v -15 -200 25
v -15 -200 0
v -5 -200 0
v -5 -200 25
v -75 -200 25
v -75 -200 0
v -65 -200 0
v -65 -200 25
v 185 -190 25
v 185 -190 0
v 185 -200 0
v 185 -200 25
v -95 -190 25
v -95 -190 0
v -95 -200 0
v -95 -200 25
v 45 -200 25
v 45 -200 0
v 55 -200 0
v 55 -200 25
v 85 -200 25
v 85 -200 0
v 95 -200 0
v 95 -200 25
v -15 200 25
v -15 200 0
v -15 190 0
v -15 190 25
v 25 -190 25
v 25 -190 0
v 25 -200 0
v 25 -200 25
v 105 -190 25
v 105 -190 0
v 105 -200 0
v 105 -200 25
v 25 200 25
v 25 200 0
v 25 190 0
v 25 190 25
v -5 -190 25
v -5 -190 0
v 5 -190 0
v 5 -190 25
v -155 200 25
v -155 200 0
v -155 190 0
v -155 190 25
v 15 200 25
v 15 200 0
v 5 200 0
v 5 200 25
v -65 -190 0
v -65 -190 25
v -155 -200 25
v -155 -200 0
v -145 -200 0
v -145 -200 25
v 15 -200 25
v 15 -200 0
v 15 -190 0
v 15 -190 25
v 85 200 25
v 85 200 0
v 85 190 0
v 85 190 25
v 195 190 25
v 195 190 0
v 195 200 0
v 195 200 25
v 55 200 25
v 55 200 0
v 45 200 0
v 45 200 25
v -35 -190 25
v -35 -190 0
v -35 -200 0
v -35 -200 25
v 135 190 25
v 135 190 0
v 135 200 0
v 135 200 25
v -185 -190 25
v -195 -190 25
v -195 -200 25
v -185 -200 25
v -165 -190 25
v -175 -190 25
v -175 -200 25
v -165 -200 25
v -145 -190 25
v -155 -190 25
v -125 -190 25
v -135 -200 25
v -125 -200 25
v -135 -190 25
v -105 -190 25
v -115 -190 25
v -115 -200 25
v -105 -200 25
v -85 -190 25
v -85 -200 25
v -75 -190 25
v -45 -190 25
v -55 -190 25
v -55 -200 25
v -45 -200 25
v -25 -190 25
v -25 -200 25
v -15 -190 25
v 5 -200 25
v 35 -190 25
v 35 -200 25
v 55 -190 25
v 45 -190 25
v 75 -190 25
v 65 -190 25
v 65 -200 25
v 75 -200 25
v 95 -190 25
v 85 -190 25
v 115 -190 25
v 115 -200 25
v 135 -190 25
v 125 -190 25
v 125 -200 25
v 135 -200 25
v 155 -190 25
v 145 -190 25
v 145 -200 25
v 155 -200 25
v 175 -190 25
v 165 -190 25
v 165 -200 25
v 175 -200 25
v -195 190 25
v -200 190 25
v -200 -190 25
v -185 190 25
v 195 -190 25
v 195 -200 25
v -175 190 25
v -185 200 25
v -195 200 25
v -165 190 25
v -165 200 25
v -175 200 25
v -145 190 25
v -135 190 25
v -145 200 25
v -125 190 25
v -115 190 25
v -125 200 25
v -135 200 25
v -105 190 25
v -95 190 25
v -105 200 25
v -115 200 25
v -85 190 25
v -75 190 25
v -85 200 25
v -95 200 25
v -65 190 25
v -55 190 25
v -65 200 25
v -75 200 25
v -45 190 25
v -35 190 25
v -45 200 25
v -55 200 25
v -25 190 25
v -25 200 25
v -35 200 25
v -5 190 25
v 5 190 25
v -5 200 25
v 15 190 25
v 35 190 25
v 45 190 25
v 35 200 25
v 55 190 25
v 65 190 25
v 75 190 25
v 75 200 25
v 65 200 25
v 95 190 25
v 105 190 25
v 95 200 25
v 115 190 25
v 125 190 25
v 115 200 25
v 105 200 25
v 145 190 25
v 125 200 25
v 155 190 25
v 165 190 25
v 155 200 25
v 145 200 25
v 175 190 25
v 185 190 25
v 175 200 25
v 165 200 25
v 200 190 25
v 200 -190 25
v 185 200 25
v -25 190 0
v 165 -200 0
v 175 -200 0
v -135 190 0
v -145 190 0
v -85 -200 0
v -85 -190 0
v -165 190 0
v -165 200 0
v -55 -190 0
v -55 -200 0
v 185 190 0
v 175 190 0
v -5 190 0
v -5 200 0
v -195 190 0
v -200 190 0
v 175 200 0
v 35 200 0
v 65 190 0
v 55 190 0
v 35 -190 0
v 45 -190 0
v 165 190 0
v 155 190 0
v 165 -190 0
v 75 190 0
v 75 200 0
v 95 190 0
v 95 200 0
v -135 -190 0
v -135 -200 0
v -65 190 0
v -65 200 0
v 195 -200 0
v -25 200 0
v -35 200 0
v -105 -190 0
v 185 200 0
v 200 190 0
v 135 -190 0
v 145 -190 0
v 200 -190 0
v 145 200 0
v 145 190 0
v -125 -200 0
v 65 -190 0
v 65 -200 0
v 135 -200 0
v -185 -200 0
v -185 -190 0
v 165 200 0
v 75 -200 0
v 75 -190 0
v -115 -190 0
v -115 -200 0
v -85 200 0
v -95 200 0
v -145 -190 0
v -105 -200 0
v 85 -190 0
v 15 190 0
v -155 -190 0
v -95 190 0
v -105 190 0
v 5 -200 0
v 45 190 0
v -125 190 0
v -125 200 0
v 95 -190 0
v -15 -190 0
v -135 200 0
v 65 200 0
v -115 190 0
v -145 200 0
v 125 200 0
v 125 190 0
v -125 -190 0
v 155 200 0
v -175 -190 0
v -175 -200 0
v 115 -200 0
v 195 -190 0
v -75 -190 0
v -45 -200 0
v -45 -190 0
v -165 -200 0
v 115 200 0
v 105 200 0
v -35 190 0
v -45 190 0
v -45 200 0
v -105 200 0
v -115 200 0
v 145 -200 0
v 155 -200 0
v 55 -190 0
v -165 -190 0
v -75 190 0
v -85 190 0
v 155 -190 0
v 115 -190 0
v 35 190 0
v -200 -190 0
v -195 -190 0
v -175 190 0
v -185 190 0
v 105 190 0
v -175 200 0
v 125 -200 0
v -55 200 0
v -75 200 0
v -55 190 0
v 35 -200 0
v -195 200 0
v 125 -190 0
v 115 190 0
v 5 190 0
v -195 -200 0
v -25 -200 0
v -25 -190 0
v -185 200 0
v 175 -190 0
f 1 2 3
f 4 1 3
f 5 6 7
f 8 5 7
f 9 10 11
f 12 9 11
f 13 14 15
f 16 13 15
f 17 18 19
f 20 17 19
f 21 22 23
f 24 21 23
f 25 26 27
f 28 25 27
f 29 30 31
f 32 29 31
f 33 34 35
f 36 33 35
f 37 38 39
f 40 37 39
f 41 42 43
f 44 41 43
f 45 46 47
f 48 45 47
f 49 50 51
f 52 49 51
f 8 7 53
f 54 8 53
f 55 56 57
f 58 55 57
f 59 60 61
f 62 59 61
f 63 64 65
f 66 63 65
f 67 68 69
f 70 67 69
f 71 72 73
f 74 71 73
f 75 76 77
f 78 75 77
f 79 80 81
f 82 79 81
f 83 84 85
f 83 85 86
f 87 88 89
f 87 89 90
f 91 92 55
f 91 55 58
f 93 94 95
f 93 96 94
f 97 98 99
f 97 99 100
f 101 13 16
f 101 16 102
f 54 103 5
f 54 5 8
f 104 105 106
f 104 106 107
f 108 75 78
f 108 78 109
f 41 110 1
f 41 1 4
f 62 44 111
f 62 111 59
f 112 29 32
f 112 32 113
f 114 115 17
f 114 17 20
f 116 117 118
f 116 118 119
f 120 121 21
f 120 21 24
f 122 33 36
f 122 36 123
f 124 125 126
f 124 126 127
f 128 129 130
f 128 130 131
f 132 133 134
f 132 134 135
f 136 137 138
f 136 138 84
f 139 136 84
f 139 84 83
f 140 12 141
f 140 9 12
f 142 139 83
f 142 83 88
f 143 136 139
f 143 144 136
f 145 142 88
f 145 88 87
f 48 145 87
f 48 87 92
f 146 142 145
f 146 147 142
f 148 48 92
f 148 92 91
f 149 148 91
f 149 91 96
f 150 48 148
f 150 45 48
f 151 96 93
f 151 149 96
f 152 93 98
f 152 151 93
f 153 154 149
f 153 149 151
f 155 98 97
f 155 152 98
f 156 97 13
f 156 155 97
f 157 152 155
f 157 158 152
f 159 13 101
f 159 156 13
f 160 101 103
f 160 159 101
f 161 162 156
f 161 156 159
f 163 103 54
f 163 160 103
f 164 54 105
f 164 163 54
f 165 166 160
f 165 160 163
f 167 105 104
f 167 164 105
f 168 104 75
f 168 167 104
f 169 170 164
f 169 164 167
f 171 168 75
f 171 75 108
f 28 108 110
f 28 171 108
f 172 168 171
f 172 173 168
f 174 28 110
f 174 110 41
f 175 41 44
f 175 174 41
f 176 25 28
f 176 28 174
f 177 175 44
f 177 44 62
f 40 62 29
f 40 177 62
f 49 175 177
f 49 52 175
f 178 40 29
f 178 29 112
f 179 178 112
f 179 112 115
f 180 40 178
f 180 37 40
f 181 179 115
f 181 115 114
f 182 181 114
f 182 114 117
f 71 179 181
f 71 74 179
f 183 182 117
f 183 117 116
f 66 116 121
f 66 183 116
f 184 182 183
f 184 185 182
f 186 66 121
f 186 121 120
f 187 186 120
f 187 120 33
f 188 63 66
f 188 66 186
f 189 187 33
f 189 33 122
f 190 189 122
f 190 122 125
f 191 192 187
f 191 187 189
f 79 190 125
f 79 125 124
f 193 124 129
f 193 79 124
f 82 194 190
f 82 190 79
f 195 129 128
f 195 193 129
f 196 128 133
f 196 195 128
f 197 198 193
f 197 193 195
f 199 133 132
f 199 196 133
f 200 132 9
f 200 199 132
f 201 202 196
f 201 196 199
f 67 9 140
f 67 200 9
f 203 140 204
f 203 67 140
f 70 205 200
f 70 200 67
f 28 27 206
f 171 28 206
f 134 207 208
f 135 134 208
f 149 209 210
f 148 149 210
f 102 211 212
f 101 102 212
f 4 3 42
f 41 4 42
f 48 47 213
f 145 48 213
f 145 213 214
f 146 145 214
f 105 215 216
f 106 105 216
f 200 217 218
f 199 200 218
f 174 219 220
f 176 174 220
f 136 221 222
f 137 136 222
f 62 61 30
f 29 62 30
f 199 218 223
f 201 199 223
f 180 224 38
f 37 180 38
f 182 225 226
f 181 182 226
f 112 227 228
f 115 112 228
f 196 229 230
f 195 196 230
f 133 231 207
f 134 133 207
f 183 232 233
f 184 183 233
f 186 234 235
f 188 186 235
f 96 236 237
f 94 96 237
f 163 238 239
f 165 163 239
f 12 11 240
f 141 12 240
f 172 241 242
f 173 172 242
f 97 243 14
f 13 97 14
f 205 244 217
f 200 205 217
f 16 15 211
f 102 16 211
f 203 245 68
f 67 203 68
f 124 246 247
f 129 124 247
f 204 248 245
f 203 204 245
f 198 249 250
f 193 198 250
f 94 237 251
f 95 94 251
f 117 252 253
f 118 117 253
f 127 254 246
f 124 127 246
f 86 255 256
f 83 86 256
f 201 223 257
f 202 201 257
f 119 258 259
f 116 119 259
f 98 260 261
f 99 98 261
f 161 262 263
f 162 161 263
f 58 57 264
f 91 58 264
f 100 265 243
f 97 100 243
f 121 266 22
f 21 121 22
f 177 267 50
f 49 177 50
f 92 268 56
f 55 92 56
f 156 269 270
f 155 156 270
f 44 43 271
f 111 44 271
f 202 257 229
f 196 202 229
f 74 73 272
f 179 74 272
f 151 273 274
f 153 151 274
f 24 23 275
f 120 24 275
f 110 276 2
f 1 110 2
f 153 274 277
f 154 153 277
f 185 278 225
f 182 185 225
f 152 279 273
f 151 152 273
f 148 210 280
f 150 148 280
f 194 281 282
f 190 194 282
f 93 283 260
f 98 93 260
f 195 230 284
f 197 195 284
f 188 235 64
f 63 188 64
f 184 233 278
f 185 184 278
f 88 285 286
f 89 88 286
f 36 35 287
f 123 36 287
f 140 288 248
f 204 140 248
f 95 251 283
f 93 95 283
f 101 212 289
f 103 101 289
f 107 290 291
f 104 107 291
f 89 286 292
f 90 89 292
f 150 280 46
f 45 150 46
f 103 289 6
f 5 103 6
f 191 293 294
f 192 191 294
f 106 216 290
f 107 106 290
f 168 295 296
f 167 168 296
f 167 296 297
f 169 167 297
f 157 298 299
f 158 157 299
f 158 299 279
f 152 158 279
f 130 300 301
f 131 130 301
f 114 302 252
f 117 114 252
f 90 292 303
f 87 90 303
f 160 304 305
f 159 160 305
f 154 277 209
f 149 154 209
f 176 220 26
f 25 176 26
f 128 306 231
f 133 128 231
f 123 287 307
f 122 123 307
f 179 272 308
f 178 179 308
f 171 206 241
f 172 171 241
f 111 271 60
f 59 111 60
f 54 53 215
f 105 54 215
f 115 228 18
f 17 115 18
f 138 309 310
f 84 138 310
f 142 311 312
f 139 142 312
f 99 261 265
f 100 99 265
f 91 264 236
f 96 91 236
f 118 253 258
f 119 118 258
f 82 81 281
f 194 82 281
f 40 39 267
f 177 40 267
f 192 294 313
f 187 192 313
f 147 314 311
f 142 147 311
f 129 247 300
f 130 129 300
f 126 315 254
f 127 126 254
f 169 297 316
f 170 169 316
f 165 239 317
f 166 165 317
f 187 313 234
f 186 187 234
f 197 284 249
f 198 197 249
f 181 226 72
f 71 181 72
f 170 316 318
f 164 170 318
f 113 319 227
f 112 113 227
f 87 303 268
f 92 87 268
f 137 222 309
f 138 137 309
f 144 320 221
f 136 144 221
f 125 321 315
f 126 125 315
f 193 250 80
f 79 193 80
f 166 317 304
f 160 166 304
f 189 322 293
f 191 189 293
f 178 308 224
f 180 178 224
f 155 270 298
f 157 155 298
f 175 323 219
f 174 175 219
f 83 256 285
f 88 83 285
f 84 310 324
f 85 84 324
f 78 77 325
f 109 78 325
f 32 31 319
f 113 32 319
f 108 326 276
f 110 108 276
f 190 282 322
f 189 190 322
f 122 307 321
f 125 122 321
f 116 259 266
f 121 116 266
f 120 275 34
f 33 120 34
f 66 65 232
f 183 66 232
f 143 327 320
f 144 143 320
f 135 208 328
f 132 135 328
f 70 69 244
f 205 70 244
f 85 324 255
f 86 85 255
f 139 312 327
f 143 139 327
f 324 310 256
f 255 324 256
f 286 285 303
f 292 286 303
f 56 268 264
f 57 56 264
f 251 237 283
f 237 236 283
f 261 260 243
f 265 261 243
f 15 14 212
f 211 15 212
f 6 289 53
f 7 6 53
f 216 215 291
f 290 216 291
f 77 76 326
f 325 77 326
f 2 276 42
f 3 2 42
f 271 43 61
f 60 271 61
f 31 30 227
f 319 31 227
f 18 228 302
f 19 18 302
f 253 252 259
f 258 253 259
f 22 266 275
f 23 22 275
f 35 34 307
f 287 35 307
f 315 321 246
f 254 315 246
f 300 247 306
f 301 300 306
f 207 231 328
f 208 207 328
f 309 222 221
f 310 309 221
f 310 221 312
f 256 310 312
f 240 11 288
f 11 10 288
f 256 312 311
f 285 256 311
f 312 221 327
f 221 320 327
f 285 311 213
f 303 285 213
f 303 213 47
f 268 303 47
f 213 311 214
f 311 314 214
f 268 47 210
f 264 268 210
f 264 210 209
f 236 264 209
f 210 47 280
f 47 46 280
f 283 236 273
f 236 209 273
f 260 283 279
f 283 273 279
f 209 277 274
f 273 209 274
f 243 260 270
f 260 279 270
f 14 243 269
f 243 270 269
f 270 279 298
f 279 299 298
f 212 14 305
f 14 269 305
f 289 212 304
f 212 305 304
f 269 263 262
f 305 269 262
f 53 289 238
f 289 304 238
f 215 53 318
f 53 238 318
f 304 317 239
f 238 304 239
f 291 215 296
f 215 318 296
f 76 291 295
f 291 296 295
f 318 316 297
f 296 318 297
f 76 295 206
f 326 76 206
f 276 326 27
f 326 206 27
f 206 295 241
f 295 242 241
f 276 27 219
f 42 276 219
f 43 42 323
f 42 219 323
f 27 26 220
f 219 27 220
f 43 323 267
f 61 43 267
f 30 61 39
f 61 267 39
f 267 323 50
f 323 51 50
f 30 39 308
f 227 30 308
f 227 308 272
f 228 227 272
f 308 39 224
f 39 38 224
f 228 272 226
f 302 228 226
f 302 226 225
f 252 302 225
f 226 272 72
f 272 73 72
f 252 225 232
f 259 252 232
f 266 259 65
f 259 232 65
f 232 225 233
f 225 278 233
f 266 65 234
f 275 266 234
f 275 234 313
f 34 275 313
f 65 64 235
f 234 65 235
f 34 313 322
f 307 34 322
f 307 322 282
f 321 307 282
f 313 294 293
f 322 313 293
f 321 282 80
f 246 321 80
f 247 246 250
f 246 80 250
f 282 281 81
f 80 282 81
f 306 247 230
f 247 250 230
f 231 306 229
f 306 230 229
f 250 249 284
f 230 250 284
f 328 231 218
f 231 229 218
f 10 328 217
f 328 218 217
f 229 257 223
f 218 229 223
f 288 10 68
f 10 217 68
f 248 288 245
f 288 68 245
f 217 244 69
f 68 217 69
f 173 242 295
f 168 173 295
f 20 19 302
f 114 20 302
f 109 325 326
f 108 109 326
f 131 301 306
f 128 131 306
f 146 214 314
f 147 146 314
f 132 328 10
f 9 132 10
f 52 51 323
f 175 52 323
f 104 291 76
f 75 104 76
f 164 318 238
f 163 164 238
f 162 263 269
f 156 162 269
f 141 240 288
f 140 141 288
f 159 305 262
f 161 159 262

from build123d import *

# Parameters (mm, degrees)
F1_DEPTH = 25


with BuildPart() as f1:
    # F0 (on Top) → F1 (new body)
    with BuildSketch(Plane.XY):
        Polygon((185, -200), (195, -200), (195, -190), (200, -190), (200, 190), (195, 190), (195, 200), (185, 200), (185, 190), (175, 190), (175, 200), (165, 200), (165, 190), (155, 190), (155, 200), (145, 200), (145, 190), (135, 190), (135, 200), (125, 200), (125, 190), (115, 190), (115, 200), (105, 200), (105, 190), (95, 190), (95, 200), (85, 200), (85, 190), (75, 190), (75, 200), (65, 200), (65, 190), (55, 190), (55, 200), (45, 200), (45, 190), (35, 190), (35, 200), (25, 200), (25, 190), (15, 190), (15, 200), (5, 200), (5, 190), (-5, 190), (-5, 200), (-15, 200), (-15, 190), (-25, 190), (-25, 200), (-35, 200), (-35, 190), (-45, 190), (-45, 200), (-55, 200), (-55, 190), (-65, 190), (-65, 200), (-75, 200), (-75, 190), (-85, 190), (-85, 200), (-95, 200), (-95, 190), (-105, 190), (-105, 200), (-115, 200), (-115, 190), (-125, 190), (-125, 200), (-135, 200), (-135, 190), (-145, 190), (-145, 200), (-155, 200), (-155, 190), (-165, 190), (-165, 200), (-175, 200), (-175, 190), (-185, 190), (-185, 200), (-195, 200), (-195, 190), (-200, 190), (-200, -190), (-195, -190), (-195, -200), (-185, -200), (-185, -190), (-175, -190), (-175, -200), (-165, -200), (-165, -190), (-155, -190), (-155, -200), (-145, -200), (-145, -190), (-135, -190), (-135, -200), (-125, -200), (-125, -190), (-115, -190), (-115, -200), (-105, -200), (-105, -190), (-95, -190), (-95, -200), (-85, -200), (-85, -190), (-75, -190), (-75, -200), (-65, -200), (-65, -190), (-55, -190), (-55, -200), (-45, -200), (-45, -190), (-35, -190), (-35, -200), (-25, -200), (-25, -190), (-15, -190), (-15, -200), (-5, -200), (-5, -190), (5, -190), (5, -200), (15, -200), (15, -190), (25, -190), (25, -200), (35, -200), (35, -190), (45, -190), (45, -200), (55, -200), (55, -190), (65, -190), (65, -200), (75, -200), (75, -190), (85, -190), (85, -200), (95, -200), (95, -190), (105, -190), (105, -200), (115, -200), (115, -190), (125, -190), (125, -200), (135, -200), (135, -190), (145, -190), (145, -200), (155, -200), (155, -190), (165, -190), (165, -200), (175, -200), (175, -190), (185, -190), align=None)
    extrude(amount=F1_DEPTH)


solid = f1.part
